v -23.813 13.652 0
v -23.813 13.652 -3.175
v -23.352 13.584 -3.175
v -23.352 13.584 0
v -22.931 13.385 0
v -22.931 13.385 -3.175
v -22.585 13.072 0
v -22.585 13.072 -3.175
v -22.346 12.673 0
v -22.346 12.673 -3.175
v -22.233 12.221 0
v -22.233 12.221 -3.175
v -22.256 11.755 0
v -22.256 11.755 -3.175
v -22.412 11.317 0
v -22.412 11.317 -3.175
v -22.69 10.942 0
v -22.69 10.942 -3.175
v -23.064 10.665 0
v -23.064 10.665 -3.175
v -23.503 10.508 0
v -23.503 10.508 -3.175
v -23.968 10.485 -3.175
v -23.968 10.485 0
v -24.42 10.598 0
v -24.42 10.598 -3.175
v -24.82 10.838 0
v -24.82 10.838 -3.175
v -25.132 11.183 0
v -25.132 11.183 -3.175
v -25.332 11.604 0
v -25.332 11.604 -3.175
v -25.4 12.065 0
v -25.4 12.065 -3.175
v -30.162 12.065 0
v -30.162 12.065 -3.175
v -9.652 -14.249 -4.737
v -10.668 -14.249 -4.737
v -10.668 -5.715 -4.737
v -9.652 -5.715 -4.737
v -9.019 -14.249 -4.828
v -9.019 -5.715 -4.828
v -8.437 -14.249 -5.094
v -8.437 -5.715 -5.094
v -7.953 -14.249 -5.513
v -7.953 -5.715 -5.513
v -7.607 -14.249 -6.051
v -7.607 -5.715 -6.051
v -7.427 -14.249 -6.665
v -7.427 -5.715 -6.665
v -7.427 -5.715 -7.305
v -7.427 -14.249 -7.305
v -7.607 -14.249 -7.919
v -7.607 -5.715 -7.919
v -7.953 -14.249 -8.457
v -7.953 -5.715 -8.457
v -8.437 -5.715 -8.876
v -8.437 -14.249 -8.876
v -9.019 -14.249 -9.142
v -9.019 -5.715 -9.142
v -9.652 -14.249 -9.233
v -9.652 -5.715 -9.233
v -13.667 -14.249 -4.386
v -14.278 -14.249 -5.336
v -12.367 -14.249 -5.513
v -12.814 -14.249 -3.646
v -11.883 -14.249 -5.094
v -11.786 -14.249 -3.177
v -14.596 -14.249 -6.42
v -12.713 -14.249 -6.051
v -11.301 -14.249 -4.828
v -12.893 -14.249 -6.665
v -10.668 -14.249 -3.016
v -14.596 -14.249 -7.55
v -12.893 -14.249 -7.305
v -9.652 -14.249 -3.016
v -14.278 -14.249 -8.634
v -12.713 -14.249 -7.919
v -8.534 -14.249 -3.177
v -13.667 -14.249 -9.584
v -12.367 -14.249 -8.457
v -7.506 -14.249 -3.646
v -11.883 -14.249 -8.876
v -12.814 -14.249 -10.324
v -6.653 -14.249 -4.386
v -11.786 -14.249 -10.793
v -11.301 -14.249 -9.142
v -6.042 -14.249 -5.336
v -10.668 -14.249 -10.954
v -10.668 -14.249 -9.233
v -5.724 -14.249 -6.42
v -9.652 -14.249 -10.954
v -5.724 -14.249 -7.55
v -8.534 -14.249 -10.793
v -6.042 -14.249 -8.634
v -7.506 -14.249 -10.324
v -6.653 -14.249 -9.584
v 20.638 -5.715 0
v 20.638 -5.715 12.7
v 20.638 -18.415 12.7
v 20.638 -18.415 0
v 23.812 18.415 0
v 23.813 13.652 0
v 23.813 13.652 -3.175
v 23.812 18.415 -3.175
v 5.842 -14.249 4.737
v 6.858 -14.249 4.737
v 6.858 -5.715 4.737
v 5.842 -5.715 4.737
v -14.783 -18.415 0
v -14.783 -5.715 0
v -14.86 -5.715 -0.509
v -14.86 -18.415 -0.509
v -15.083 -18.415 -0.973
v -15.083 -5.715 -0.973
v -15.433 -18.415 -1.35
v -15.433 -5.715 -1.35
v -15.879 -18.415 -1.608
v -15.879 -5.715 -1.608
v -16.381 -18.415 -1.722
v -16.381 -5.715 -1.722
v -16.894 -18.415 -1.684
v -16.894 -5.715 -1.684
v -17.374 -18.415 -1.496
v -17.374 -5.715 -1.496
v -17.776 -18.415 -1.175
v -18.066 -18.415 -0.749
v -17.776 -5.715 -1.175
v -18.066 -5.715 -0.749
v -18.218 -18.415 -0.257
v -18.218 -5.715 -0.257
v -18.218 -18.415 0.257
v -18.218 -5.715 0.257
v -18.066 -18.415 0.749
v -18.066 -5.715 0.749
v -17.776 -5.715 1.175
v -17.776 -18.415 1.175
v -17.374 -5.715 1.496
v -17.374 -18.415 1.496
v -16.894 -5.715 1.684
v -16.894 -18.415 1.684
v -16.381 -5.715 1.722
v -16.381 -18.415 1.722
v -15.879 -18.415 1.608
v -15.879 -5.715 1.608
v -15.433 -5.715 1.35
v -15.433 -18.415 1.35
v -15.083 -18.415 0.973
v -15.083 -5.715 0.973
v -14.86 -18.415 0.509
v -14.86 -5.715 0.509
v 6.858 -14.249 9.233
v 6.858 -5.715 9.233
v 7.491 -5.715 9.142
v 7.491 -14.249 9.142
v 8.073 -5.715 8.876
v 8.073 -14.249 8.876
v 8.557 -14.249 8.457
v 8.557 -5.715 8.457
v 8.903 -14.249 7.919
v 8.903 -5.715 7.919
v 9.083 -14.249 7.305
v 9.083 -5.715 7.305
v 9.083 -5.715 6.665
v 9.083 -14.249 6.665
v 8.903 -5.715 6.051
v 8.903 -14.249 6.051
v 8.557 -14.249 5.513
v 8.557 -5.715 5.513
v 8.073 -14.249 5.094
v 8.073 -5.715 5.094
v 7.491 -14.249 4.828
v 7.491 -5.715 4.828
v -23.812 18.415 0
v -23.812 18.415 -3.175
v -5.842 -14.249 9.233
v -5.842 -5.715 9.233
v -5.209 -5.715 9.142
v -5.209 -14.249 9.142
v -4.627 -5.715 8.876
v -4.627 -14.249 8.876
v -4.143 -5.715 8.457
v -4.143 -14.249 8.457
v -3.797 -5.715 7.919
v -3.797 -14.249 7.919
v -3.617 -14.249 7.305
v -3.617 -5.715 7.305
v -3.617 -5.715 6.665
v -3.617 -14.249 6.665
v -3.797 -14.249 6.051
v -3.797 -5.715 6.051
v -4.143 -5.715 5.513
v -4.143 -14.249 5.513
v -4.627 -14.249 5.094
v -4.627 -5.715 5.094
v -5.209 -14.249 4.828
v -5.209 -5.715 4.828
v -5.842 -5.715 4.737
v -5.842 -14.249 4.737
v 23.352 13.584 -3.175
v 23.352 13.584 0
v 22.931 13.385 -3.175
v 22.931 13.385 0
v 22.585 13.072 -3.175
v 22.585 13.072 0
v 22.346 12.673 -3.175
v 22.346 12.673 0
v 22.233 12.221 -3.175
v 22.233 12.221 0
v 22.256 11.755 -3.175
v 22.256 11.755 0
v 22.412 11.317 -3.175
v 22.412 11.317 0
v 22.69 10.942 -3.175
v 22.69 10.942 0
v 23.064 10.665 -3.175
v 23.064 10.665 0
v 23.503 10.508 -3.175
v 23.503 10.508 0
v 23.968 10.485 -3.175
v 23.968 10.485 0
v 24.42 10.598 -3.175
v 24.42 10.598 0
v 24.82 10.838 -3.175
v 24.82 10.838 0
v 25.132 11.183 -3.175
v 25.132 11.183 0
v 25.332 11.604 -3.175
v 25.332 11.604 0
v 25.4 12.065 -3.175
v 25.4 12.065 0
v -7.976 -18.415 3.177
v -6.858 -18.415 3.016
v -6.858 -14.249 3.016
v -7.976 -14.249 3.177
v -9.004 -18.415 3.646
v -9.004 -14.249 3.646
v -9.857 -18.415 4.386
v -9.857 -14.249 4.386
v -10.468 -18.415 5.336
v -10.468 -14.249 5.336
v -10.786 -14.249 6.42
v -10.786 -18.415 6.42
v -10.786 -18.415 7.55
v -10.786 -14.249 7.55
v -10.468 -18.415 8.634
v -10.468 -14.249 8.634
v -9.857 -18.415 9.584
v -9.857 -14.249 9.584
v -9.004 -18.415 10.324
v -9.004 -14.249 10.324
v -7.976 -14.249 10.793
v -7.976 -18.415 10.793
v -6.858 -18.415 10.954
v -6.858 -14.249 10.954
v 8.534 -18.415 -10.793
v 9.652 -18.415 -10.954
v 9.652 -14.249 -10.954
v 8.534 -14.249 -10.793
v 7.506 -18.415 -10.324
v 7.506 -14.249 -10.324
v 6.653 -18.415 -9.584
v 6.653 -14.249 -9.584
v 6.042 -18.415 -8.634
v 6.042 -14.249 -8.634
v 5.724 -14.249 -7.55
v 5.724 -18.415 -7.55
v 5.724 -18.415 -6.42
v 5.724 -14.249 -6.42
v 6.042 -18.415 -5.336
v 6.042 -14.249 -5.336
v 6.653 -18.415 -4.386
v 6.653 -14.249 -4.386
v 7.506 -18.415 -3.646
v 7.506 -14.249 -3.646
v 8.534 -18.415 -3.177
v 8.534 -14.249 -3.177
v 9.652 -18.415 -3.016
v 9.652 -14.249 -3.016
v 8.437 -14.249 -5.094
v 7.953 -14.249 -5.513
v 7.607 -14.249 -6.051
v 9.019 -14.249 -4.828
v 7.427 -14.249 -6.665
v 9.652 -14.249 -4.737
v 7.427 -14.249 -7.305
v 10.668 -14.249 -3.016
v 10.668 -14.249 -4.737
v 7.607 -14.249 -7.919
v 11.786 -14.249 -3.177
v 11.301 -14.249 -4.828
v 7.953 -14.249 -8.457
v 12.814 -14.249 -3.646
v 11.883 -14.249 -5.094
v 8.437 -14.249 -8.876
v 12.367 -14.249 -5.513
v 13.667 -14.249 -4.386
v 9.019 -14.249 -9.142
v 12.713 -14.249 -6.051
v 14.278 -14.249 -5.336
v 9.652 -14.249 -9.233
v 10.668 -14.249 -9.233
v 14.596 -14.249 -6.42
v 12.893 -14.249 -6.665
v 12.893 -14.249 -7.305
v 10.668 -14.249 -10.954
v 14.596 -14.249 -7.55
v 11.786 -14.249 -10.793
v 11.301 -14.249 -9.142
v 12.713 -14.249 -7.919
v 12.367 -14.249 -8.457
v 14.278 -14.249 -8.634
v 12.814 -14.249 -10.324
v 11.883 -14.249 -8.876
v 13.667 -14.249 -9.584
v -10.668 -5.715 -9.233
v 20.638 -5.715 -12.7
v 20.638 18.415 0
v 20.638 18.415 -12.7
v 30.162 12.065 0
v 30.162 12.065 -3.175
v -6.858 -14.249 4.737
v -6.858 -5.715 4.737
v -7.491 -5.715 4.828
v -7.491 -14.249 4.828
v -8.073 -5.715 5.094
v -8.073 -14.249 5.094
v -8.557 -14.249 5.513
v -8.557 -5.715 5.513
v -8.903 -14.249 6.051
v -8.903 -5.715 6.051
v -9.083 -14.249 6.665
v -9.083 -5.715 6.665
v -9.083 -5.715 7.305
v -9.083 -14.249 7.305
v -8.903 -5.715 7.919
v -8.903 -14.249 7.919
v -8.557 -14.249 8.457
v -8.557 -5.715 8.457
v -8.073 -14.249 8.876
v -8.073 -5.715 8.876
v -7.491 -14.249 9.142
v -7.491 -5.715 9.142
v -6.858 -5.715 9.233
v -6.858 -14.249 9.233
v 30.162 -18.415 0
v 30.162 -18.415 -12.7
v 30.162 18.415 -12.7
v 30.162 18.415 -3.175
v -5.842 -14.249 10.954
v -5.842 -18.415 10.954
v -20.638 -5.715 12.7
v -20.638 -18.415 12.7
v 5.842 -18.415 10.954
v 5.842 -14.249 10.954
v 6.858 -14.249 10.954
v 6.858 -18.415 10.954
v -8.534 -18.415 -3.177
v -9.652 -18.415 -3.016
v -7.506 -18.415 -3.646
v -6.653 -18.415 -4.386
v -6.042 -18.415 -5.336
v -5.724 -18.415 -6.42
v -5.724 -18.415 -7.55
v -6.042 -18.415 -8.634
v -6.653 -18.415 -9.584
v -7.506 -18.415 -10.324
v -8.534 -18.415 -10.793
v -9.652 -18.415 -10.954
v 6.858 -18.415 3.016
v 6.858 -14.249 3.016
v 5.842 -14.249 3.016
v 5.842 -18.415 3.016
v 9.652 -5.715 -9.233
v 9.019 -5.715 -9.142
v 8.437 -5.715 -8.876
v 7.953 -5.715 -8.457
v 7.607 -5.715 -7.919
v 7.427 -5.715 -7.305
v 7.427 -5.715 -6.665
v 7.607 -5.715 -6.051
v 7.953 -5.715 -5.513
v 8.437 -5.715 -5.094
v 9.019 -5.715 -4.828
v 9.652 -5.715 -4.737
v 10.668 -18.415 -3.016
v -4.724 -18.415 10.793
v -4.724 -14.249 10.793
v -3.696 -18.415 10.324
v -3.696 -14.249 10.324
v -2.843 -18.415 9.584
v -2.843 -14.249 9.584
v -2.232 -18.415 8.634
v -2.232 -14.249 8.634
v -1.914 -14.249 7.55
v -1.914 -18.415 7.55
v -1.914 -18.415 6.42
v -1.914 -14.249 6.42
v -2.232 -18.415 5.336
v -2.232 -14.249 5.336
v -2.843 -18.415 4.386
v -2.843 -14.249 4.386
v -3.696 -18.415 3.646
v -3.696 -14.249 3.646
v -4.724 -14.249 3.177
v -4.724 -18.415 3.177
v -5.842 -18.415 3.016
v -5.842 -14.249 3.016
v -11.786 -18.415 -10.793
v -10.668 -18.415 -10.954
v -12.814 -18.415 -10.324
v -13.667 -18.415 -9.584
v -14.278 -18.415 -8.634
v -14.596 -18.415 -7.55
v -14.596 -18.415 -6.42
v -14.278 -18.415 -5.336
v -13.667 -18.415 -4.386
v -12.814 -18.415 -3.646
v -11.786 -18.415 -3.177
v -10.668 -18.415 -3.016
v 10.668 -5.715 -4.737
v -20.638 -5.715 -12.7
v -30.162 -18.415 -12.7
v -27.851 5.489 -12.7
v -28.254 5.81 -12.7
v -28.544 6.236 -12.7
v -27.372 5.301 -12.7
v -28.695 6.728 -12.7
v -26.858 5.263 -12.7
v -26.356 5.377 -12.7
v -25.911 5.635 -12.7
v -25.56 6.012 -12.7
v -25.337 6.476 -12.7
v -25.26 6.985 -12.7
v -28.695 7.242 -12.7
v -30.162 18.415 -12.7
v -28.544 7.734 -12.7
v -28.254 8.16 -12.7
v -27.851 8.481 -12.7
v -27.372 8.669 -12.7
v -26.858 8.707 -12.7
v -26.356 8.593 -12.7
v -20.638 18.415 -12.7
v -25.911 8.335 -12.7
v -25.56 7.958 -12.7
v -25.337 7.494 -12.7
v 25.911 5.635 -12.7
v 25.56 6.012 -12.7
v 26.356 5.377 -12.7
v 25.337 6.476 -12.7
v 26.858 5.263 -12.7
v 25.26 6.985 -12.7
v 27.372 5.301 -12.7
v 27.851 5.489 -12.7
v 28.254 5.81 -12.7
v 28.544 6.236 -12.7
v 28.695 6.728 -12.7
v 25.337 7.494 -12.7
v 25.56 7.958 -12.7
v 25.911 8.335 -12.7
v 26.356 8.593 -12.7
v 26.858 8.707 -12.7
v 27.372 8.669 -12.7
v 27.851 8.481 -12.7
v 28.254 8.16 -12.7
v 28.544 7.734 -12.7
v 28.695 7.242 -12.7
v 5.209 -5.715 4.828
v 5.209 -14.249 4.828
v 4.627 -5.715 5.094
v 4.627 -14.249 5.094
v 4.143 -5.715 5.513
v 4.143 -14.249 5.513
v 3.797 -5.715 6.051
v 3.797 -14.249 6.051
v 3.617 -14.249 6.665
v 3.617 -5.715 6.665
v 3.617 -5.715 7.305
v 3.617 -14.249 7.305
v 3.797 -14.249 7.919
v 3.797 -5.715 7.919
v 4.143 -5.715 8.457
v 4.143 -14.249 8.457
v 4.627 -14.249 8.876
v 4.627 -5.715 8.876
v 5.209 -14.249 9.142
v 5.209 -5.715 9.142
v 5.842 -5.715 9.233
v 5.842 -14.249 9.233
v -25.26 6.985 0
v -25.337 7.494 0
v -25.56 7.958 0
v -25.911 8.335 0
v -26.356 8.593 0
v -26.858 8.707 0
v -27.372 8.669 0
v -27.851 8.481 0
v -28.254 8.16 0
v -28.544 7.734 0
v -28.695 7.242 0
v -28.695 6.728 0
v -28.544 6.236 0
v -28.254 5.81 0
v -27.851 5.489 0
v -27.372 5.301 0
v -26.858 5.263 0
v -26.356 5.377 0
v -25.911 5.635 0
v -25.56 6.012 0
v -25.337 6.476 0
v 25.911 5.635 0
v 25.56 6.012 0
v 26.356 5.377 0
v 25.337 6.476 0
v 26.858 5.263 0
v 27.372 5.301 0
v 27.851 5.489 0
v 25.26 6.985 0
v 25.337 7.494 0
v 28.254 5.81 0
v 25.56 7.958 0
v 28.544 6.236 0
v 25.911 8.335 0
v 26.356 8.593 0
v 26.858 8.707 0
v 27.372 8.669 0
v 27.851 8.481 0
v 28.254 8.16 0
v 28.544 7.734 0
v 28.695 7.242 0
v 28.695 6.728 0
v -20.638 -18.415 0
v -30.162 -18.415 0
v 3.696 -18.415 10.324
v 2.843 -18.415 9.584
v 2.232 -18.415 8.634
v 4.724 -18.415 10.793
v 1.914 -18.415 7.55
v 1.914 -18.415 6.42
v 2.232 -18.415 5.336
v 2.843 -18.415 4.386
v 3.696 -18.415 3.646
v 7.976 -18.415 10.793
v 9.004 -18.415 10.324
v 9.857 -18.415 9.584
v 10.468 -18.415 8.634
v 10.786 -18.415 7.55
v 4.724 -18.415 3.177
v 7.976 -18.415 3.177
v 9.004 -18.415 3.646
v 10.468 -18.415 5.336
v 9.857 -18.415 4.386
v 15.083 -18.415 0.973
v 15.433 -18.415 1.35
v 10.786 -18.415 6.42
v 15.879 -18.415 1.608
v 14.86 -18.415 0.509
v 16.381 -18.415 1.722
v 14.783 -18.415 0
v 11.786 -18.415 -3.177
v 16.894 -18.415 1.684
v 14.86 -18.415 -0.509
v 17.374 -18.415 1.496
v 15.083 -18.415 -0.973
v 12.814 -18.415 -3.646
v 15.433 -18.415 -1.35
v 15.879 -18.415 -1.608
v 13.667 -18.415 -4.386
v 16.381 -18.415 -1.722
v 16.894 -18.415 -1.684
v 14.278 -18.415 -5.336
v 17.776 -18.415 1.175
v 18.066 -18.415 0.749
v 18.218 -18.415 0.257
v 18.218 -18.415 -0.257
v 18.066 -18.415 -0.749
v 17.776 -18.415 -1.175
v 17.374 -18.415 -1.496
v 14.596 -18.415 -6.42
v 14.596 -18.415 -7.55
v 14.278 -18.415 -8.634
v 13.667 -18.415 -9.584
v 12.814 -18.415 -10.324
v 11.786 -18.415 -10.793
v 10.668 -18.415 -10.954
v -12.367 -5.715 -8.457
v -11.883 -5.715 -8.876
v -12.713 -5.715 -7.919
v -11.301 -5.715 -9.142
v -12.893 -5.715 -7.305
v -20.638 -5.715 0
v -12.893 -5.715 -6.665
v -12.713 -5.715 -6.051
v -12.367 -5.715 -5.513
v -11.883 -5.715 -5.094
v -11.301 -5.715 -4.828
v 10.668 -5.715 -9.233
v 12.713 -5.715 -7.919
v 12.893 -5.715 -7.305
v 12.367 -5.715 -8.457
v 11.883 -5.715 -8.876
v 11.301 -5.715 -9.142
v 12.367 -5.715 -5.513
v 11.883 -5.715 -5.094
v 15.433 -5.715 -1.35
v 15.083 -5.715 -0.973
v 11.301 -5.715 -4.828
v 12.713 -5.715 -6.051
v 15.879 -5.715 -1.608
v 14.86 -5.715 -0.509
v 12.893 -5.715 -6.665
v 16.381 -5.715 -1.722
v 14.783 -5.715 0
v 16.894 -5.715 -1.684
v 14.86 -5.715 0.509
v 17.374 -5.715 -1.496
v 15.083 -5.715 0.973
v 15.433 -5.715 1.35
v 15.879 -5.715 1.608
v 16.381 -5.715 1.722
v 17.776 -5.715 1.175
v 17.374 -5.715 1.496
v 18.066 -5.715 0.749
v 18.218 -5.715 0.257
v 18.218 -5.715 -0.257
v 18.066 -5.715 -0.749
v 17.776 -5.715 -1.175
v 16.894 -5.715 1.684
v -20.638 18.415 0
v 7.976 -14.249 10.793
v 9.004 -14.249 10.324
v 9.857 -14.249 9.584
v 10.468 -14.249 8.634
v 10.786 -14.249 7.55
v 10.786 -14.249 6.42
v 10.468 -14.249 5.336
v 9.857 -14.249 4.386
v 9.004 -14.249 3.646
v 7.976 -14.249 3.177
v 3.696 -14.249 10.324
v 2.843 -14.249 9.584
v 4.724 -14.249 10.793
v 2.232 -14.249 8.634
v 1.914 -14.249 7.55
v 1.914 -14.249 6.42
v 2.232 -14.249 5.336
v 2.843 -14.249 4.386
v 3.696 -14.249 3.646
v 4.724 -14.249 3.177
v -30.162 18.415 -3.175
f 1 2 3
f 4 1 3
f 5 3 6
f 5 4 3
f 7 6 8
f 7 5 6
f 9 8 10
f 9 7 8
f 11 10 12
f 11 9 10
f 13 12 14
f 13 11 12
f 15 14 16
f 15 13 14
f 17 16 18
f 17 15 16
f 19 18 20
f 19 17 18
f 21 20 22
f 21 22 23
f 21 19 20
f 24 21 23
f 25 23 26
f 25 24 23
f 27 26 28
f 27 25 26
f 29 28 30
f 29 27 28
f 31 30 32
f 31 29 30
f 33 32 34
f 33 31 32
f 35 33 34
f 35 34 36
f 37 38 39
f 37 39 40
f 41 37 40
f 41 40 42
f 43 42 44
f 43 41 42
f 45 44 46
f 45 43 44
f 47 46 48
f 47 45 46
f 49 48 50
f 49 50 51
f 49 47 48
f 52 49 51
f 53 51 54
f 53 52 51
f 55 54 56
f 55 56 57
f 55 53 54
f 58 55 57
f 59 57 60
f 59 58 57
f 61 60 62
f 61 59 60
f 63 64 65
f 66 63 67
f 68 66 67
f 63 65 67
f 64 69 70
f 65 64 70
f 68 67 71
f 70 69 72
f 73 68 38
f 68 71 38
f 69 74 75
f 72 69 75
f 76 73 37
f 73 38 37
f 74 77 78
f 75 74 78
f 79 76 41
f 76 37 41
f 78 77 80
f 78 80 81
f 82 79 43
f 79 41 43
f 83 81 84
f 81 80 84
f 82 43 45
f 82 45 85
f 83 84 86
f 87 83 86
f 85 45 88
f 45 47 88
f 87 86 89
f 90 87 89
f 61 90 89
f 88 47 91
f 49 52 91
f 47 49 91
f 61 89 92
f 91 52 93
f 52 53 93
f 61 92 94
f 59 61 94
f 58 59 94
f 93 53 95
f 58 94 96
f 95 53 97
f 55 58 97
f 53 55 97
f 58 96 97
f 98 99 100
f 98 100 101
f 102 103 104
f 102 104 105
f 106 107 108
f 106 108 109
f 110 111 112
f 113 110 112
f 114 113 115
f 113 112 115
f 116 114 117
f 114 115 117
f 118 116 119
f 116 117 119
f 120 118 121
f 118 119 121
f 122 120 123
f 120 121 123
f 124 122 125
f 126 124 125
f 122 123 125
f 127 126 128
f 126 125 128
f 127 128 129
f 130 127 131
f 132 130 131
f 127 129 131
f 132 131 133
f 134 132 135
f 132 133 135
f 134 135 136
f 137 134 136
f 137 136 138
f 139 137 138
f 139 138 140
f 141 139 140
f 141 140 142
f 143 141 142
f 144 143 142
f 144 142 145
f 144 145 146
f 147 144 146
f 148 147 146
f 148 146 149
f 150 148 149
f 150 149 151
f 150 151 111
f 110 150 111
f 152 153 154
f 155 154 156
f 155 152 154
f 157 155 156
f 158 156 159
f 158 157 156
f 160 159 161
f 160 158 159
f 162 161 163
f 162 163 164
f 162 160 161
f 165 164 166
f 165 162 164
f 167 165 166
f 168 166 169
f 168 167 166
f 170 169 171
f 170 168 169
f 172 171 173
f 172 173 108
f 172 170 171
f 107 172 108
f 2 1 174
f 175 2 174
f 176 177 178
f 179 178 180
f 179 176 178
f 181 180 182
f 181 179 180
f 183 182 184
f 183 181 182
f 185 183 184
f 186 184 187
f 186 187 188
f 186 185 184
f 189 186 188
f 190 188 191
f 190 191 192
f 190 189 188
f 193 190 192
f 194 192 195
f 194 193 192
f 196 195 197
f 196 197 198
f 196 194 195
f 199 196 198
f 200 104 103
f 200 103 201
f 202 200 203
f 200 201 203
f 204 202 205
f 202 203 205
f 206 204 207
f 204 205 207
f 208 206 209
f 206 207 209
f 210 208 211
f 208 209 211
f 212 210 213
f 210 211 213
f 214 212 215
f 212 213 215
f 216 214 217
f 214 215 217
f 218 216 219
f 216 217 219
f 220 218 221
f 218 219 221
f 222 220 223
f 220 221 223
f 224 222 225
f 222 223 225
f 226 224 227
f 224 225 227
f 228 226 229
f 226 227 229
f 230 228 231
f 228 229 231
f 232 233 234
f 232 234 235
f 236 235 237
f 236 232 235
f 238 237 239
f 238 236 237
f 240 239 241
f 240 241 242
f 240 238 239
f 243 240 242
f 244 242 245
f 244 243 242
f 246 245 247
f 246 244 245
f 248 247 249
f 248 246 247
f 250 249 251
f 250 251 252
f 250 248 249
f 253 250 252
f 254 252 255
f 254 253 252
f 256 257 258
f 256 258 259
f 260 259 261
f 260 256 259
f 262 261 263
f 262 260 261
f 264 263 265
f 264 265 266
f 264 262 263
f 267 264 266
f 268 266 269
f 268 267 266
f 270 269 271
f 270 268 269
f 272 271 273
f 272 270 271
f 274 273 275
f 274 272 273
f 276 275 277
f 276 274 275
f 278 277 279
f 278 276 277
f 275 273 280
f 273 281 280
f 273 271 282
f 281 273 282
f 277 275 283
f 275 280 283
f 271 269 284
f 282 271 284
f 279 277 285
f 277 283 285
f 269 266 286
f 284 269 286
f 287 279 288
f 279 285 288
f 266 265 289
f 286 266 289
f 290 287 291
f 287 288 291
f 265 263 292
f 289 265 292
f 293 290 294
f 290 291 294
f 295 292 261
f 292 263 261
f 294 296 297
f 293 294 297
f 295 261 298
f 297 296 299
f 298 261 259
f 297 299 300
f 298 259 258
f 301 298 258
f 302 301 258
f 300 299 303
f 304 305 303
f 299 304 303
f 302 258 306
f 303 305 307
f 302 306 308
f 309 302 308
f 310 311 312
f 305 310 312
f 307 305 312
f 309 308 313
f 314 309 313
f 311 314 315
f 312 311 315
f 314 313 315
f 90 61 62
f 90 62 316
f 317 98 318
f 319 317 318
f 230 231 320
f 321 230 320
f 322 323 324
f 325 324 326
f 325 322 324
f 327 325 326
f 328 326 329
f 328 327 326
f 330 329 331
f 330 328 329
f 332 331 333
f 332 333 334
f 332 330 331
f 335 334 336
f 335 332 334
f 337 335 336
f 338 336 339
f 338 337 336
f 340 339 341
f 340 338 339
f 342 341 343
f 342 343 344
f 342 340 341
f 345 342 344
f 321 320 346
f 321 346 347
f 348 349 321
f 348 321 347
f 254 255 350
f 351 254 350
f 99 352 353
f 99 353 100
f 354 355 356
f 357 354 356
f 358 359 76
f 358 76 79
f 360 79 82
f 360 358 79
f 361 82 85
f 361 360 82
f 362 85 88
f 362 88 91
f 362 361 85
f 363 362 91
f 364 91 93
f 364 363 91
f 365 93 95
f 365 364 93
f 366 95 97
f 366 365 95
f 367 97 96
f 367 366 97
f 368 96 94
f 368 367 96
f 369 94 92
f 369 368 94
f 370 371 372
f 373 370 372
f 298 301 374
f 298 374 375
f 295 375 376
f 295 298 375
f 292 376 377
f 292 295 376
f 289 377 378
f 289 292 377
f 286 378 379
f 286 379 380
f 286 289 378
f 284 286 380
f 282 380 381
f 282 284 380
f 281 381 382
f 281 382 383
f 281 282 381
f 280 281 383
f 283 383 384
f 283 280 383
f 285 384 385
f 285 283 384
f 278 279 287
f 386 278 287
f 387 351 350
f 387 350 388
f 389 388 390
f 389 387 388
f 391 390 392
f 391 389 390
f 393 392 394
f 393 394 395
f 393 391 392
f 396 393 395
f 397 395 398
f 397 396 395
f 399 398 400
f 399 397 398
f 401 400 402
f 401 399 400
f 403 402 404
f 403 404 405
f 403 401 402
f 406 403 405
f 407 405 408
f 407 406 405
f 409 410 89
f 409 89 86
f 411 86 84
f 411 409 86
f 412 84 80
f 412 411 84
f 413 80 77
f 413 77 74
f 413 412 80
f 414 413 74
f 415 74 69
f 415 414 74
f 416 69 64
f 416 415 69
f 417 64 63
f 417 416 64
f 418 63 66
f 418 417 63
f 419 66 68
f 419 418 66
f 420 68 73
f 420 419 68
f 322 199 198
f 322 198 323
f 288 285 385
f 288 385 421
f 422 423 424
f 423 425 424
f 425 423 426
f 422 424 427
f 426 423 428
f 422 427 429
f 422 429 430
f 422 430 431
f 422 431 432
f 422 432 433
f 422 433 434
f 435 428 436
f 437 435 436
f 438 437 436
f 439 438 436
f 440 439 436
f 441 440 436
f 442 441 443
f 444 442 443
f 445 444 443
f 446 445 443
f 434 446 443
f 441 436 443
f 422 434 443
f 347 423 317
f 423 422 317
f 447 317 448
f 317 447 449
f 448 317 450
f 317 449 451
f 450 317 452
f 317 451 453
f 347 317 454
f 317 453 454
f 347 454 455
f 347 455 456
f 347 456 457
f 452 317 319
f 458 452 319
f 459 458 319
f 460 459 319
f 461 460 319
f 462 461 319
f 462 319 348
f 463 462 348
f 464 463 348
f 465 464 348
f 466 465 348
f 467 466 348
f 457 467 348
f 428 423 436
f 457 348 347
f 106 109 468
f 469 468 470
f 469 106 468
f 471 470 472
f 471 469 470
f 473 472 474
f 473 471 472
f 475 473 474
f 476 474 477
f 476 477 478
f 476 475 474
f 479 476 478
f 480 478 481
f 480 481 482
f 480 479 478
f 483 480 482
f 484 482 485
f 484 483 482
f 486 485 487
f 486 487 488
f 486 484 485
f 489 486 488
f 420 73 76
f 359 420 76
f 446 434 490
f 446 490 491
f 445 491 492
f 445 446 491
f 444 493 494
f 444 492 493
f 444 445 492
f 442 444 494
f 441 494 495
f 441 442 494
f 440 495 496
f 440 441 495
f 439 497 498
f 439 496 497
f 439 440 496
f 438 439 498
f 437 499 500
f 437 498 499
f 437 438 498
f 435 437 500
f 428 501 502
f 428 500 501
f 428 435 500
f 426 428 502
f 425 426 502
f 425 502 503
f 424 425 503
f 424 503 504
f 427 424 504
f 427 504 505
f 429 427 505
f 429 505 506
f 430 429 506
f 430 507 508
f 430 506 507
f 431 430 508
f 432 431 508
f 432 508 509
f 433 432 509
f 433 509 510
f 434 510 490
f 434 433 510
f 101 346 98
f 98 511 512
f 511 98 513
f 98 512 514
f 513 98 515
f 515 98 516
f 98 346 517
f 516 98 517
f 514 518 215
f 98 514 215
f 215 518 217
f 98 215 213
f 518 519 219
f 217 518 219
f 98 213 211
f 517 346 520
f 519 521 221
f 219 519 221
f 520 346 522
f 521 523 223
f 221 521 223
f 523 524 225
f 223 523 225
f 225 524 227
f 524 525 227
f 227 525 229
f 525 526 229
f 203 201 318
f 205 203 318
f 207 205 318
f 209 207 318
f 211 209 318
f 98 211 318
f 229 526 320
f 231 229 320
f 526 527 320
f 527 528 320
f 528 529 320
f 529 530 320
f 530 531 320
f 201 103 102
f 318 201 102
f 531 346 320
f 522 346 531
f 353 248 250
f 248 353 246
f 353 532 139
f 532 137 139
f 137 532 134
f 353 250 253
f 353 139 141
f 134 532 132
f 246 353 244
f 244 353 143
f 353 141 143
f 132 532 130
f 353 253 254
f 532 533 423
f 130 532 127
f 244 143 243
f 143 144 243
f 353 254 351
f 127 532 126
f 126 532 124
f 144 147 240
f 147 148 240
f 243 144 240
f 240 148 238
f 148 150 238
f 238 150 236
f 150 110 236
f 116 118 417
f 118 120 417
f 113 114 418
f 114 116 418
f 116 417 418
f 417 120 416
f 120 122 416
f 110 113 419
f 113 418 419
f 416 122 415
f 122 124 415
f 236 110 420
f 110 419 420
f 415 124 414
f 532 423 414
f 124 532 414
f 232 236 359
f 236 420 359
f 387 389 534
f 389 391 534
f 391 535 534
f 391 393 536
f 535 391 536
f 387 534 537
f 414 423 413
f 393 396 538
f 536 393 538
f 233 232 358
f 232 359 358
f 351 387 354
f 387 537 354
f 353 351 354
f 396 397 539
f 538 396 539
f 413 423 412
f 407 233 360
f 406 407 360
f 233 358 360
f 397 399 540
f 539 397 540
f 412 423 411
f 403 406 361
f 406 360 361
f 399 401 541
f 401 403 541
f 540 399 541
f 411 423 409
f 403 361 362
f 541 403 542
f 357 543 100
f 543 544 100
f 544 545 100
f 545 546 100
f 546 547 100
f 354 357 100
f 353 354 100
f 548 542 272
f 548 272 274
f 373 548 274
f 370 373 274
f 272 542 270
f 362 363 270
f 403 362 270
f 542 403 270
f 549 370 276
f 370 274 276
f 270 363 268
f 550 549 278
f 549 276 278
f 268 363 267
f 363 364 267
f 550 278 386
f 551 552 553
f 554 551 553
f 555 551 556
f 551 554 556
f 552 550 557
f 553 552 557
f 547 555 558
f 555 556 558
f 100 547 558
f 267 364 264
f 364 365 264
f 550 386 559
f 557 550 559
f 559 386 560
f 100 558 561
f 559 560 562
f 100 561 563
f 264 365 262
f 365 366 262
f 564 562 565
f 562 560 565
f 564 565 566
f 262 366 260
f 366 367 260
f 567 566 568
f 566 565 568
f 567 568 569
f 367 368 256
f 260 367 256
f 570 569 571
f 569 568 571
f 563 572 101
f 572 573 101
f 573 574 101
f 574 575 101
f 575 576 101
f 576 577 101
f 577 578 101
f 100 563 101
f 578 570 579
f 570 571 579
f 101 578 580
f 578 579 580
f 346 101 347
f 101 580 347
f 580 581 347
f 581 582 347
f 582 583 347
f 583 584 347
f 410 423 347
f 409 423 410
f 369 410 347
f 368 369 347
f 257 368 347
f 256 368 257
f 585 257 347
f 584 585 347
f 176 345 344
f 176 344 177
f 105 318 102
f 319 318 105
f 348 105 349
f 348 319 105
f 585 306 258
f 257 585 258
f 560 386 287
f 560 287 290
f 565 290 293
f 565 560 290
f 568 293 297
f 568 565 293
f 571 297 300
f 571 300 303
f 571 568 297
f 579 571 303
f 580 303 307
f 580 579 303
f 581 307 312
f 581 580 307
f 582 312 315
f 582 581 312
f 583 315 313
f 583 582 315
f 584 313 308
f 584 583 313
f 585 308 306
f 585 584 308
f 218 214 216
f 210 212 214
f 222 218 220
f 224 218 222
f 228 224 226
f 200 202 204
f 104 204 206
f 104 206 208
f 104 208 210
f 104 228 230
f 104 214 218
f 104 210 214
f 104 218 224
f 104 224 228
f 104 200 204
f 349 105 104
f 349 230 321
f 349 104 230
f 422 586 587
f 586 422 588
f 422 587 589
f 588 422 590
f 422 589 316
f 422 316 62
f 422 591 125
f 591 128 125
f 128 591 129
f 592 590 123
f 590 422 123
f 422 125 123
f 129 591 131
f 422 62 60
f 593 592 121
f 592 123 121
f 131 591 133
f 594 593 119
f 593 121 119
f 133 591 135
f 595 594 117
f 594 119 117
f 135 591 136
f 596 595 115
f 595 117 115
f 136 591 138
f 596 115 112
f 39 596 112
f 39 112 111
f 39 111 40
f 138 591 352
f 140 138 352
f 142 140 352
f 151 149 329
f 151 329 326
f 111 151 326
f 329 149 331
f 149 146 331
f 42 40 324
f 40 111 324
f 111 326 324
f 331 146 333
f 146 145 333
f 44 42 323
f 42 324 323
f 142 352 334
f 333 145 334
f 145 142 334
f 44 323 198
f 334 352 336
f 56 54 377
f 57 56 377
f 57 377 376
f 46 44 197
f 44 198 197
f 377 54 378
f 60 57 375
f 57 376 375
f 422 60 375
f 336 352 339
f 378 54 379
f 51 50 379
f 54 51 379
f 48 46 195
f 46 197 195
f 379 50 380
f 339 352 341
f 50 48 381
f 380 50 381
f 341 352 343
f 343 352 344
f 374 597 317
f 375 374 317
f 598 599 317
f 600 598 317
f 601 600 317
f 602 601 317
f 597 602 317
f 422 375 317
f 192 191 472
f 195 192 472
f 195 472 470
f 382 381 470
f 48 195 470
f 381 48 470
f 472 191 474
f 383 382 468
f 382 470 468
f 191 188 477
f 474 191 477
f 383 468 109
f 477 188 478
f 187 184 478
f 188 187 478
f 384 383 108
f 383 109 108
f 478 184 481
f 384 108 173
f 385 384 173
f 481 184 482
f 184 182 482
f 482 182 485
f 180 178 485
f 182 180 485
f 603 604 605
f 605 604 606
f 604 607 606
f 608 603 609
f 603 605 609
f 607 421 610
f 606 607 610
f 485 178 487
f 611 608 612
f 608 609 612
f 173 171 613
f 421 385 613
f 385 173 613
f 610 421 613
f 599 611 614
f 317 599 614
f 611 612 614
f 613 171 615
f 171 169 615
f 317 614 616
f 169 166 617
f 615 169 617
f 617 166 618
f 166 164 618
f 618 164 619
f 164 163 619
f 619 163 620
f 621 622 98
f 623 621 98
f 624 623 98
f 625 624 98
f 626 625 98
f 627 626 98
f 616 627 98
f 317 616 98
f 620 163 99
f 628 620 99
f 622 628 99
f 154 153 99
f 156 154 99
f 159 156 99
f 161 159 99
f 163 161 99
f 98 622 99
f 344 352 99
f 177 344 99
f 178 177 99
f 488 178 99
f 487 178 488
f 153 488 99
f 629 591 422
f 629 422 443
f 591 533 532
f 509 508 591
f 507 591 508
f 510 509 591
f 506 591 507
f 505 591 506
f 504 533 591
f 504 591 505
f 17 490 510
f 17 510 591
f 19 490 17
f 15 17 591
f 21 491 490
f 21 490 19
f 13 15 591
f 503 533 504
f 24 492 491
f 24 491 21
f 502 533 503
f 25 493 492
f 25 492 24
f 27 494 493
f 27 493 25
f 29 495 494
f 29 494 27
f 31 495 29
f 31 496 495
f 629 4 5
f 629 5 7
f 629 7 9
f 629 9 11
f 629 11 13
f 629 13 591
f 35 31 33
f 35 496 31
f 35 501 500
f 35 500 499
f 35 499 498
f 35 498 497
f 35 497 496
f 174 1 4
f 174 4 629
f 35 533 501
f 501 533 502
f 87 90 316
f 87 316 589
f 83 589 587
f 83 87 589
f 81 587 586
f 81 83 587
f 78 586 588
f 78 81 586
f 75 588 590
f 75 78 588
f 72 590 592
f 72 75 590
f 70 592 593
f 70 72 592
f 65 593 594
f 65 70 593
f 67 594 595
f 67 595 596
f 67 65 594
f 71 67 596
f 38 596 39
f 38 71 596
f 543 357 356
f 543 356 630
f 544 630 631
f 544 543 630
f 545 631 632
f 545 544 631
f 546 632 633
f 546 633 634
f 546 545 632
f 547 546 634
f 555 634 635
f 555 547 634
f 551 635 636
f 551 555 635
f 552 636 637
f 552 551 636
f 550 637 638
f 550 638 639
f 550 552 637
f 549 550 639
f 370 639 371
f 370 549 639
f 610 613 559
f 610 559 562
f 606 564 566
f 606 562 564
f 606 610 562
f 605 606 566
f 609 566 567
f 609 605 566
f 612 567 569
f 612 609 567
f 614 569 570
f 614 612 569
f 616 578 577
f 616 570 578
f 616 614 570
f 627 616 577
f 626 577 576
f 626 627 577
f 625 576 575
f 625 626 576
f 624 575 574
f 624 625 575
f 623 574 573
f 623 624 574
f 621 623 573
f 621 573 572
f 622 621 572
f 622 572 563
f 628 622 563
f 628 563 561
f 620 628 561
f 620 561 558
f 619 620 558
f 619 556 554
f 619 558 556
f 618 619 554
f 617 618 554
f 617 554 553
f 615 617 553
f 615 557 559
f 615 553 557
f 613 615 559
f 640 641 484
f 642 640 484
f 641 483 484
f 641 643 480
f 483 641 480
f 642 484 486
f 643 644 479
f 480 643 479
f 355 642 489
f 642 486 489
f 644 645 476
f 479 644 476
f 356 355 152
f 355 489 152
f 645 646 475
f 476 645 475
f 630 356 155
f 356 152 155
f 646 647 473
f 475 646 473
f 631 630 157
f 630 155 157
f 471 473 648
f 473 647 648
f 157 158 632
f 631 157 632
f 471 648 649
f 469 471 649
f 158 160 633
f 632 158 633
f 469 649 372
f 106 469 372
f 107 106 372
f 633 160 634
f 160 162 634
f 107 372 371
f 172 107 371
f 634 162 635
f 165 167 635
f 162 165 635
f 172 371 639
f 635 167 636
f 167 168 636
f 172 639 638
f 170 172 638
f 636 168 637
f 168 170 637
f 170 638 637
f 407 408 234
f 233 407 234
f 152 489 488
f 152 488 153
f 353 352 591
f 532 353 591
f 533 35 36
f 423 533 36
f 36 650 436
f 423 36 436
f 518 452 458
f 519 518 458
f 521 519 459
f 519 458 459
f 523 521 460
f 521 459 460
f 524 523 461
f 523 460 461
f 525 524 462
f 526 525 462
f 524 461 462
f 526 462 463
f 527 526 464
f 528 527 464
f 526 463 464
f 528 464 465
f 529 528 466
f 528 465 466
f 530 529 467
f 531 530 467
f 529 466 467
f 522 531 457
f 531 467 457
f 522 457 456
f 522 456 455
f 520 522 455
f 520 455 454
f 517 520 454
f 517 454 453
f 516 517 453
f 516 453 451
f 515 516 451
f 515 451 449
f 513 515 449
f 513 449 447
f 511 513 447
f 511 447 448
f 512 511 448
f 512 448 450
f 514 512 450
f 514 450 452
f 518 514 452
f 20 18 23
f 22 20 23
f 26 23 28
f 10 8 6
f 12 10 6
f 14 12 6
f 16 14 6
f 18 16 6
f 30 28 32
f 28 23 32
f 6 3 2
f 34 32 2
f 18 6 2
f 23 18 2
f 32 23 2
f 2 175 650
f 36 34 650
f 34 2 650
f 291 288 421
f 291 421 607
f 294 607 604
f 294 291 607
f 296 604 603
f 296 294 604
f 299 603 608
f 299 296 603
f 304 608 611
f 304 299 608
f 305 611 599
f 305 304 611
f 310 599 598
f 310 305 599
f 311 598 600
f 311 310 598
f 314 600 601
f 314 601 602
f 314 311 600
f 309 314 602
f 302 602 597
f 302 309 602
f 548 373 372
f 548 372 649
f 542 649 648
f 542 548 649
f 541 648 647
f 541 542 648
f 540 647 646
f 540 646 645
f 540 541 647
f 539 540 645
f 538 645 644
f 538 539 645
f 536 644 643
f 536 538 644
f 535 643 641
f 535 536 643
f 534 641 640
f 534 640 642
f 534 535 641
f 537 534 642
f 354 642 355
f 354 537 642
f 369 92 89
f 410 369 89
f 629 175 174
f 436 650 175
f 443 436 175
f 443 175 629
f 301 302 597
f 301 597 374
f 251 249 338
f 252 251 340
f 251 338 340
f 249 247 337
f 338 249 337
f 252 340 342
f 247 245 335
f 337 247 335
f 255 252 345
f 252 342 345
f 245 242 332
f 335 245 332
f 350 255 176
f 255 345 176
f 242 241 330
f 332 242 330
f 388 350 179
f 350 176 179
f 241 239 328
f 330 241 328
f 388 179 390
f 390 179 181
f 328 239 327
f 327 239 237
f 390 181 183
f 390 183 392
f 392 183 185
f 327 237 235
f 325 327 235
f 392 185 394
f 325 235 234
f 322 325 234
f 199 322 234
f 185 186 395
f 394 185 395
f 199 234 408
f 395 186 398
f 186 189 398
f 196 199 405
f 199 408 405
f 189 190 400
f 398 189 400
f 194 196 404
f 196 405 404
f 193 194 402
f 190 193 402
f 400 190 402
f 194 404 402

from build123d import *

# Parameters (mm, degrees)
SKETCH1_W                                     = 60.325
SKETCH1_H                                     = 25.4
BOSS_EXTRUDE1_DEPTH                           = 18.415
SKETCH2_W                                     = 41.275
SKETCH2_H                                     = 24.13
CUT_EXTRUDE1_DEPTH                            = 44.520669012
SKETCH3_W                                     = 12.7
SKETCH3_H                                     = 36.83
CUT_EXTRUDE2_DEPTH                            = 9.525
SKETCH4_W                                     = 6.35
SKETCH4_H                                     = 6.35
CUT_EXTRUDE3_DEPTH                            = 3.175
SKETCH5_R                                     = 1.5875
CUT_EXTRUDE4_DEPTH                            = 3.175
F_8_32_TAPPED_HOLE1_D                         = 3.4544
F_8_32_TAPPED_HOLE2_D                         = 3.4544
CBORE_START                                   = -18.415
CBORE_SLOT_FOR_8_SOCKET_HEAD_CAP_SCREW1_DEPTH = 12.7
CBORE_SLOT_FOR_8_SOCKET_HEAD_CAP_SC_3_DEPTH   = 4.1656


# Read off the part's stored shape, not the designer's step: CBORE SLOT for #8 Socket Head Cap Screw1
with BuildPart() as part:
    # Sketch1 → Boss-Extrude1 (new, symmetric)
    with BuildSketch(Plane(origin=(0, 0, 0), x_dir=(1, 0, 0), z_dir=(0, 1, 0))):
        Rectangle(SKETCH1_W, SKETCH1_H)
    extrude(amount=BOSS_EXTRUDE1_DEPTH, both=True)

    # Sketch2 → Cut-Extrude1 (cut, through all)
    with BuildSketch(Plane.XY.offset(12.7)):
        with Locations((0, 6.35)):
            Rectangle(SKETCH2_W, SKETCH2_H)
    extrude(amount=-CUT_EXTRUDE1_DEPTH, mode=Mode.SUBTRACT)

    # Sketch3 → Cut-Extrude2 (cut)
    with BuildSketch(Plane(origin=(30.1625, 0, 0), x_dir=(0, 0, -1), z_dir=(1, 0, 0))):
        with Locations((-6.35, 0)):
            Rectangle(SKETCH3_W, SKETCH3_H)
    cut_extrude2 = extrude(amount=-CUT_EXTRUDE2_DEPTH, mode=Mode.SUBTRACT)

    # Sketch4 → Cut-Extrude3 (cut)
    with BuildSketch(Plane.XY):
        with Locations((26.9875, 15.24)):
            Rectangle(SKETCH4_W, SKETCH4_H)
    cut_extrude3 = extrude(amount=-CUT_EXTRUDE3_DEPTH, mode=Mode.SUBTRACT)

    # Sketch5 → Cut-Extrude4 (cut)
    with BuildSketch(Plane.XY):
        with Locations((23.8125, 12.065)):
            Circle(SKETCH5_R)
    cut_extrude4 = extrude(amount=-CUT_EXTRUDE4_DEPTH, mode=Mode.SUBTRACT)

    # #8-32 Tapped Hole1 (through all)
    with Locations(Plane.XY):
        with Locations((26.9875, 6.985)):
            f_8_32_tapped_hole1 = Hole(F_8_32_TAPPED_HOLE1_D / 2)

    # Mirror1: Cut-Extrude2, Cut-Extrude3, Cut-Extrude4, #8-32 Tapped Hole1 across plane
    add(cut_extrude2.mirror(Plane(origin=(0, 0, 0), x_dir=(0, 0, 1), z_dir=(1, 0, 0))), mode=Mode.SUBTRACT)
    add(cut_extrude3.mirror(Plane(origin=(0, 0, 0), x_dir=(0, 0, 1), z_dir=(1, 0, 0))), mode=Mode.SUBTRACT)
    add(cut_extrude4.mirror(Plane(origin=(0, 0, 0), x_dir=(0, 0, 1), z_dir=(1, 0, 0))), mode=Mode.SUBTRACT)
    add(f_8_32_tapped_hole1.mirror(Plane(origin=(0, 0, 0), x_dir=(0, 0, 1), z_dir=(1, 0, 0))), mode=Mode.SUBTRACT)

    # #8-32 Tapped Hole2 (through all)
    with Locations(Plane(origin=(0, -18.415, 0), x_dir=(-1, 0, 0), z_dir=(0, -1, 0))):
        with Locations((16.51, 0)):
            f_8_32_tapped_hole2 = Hole(F_8_32_TAPPED_HOLE2_D / 2)

    # CBORE SLOT for _8 Socket Head Cap Sc 2 → CBORE SLOT for #8 Socket Head Cap Screw1 (cut)
    with BuildSketch(Plane(origin=(0, 0, 0), x_dir=(1, 0, 0), z_dir=(0, 1, 0)).offset(CBORE_START)):
        with BuildLine():
            ThreePointArc((-9.652, 4.7371), (-7.4041, 6.985), (-9.652, 9.2329))
            Line((-9.652, 9.2329), (-10.668, 9.2329))
            ThreePointArc((-10.668, 9.2329), (-12.9159, 6.985), (-10.668, 4.7371))
            Line((-10.668, 4.7371), (-9.652, 4.7371))
        make_face()
        with BuildLine():
            ThreePointArc((9.652, 9.2329), (7.4041, 6.985), (9.652, 4.7371))
            Line((9.652, 4.7371), (10.668, 4.7371))
            ThreePointArc((10.668, 4.7371), (12.9159, 6.985), (10.668, 9.2329))
            Line((10.668, 9.2329), (9.652, 9.2329))
        make_face()
        with BuildLine():
            ThreePointArc((6.858, -9.2329), (9.1059, -6.985), (6.858, -4.7371))
            Line((6.858, -4.7371), (5.842, -4.7371))
            ThreePointArc((5.842, -4.7371), (3.5941, -6.985), (5.842, -9.2329))
            Line((5.842, -9.2329), (6.858, -9.2329))
        make_face()
        with BuildLine():
            ThreePointArc((-6.858, -4.7371), (-9.1059, -6.985), (-6.858, -9.2329))
            Line((-6.858, -9.2329), (-5.842, -9.2329))
            ThreePointArc((-5.842, -9.2329), (-3.5941, -6.985), (-5.842, -4.7371))
            Line((-5.842, -4.7371), (-6.858, -4.7371))
        make_face()
    extrude(amount=CBORE_SLOT_FOR_8_SOCKET_HEAD_CAP_SCREW1_DEPTH, mode=Mode.SUBTRACT)

    # CBORE SLOT for _8 Socket Head Cap Sc 3 o → CBORE SLOT for _8 Socket Head Cap Sc 3 (cut)
    # profile 1 of 4: a face of its own
    with BuildSketch(Plane(origin=(0, 0, 0), x_dir=(1, 0, 0), z_dir=(0, 1, 0)).offset(CBORE_START)):
        with BuildLine():
            ThreePointArc((-9.652, 3.01625), (-5.68325, 6.985), (-9.652, 10.95375))
            Line((-9.652, 10.95375), (-10.668, 10.95375))
            ThreePointArc((-10.668, 10.95375), (-14.63675, 6.985), (-10.668, 3.01625))
            Line((-10.668, 3.01625), (-9.652, 3.01625))
        make_face()
        with BuildLine():
            Line((-10.668, 9.2329), (-9.652, 9.2329))
            ThreePointArc((-9.652, 9.2329), (-7.4041, 6.985), (-9.652, 4.7371))
            Line((-9.652, 4.7371), (-10.668, 4.7371))
            ThreePointArc((-10.668, 4.7371), (-12.9159, 6.985), (-10.668, 9.2329))
        make_face(mode=Mode.SUBTRACT)
    # profile 2 of 4: a face of its own
    with BuildSketch(Plane(origin=(0, 0, 0), x_dir=(1, 0, 0), z_dir=(0, 1, 0)).offset(CBORE_START)):
        with BuildLine():
            ThreePointArc((9.652, 10.95375), (5.68325, 6.985), (9.652, 3.01625))
            Line((9.652, 3.01625), (10.668, 3.01625))
            ThreePointArc((10.668, 3.01625), (14.63675, 6.985), (10.668, 10.95375))
            Line((10.668, 10.95375), (9.652, 10.95375))
        make_face()
        with BuildLine():
            Line((10.668, 4.7371), (9.652, 4.7371))
            ThreePointArc((9.652, 4.7371), (7.4041, 6.985), (9.652, 9.2329))
            Line((9.652, 9.2329), (10.668, 9.2329))
            ThreePointArc((10.668, 9.2329), (12.9159, 6.985), (10.668, 4.7371))
        make_face(mode=Mode.SUBTRACT)
    # profile 3 of 4: a face of its own
    with BuildSketch(Plane(origin=(0, 0, 0), x_dir=(1, 0, 0), z_dir=(0, 1, 0)).offset(CBORE_START)):
        with BuildLine():
            ThreePointArc((6.858, -10.95375), (10.82675, -6.985), (6.858, -3.01625))
            Line((6.858, -3.01625), (5.842, -3.01625))
            ThreePointArc((5.842, -3.01625), (1.87325, -6.985), (5.842, -10.95375))
            Line((5.842, -10.95375), (6.858, -10.95375))
        make_face()
        with BuildLine():
            Line((5.842, -4.7371), (6.858, -4.7371))
            ThreePointArc((6.858, -4.7371), (9.1059, -6.985), (6.858, -9.2329))
            Line((6.858, -9.2329), (5.842, -9.2329))
            ThreePointArc((5.842, -9.2329), (3.5941, -6.985), (5.842, -4.7371))
        make_face(mode=Mode.SUBTRACT)
    # profile 4 of 4: a face of its own
    with BuildSketch(Plane(origin=(0, 0, 0), x_dir=(1, 0, 0), z_dir=(0, 1, 0)).offset(CBORE_START)):
        with BuildLine():
            ThreePointArc((-6.858, -3.01625), (-10.82675, -6.985), (-6.858, -10.95375))
            Line((-6.858, -10.95375), (-5.842, -10.95375))
            ThreePointArc((-5.842, -10.95375), (-1.87325, -6.985), (-5.842, -3.01625))
            Line((-5.842, -3.01625), (-6.858, -3.01625))
        make_face()
        with BuildLine():
            Line((-5.842, -9.2329), (-6.858, -9.2329))
            ThreePointArc((-6.858, -9.2329), (-9.1059, -6.985), (-6.858, -4.7371))
            Line((-6.858, -4.7371), (-5.842, -4.7371))
            ThreePointArc((-5.842, -4.7371), (-3.5941, -6.985), (-5.842, -9.2329))
        make_face(mode=Mode.SUBTRACT)
    extrude(amount=CBORE_SLOT_FOR_8_SOCKET_HEAD_CAP_SC_3_DEPTH, mode=Mode.SUBTRACT)

    # Mirror2: #8-32 Tapped Hole2 across plane
    add(f_8_32_tapped_hole2.mirror(Plane(origin=(0, 0, 0), x_dir=(0, 0, 1), z_dir=(1, 0, 0))), mode=Mode.SUBTRACT)


solid = part.part
